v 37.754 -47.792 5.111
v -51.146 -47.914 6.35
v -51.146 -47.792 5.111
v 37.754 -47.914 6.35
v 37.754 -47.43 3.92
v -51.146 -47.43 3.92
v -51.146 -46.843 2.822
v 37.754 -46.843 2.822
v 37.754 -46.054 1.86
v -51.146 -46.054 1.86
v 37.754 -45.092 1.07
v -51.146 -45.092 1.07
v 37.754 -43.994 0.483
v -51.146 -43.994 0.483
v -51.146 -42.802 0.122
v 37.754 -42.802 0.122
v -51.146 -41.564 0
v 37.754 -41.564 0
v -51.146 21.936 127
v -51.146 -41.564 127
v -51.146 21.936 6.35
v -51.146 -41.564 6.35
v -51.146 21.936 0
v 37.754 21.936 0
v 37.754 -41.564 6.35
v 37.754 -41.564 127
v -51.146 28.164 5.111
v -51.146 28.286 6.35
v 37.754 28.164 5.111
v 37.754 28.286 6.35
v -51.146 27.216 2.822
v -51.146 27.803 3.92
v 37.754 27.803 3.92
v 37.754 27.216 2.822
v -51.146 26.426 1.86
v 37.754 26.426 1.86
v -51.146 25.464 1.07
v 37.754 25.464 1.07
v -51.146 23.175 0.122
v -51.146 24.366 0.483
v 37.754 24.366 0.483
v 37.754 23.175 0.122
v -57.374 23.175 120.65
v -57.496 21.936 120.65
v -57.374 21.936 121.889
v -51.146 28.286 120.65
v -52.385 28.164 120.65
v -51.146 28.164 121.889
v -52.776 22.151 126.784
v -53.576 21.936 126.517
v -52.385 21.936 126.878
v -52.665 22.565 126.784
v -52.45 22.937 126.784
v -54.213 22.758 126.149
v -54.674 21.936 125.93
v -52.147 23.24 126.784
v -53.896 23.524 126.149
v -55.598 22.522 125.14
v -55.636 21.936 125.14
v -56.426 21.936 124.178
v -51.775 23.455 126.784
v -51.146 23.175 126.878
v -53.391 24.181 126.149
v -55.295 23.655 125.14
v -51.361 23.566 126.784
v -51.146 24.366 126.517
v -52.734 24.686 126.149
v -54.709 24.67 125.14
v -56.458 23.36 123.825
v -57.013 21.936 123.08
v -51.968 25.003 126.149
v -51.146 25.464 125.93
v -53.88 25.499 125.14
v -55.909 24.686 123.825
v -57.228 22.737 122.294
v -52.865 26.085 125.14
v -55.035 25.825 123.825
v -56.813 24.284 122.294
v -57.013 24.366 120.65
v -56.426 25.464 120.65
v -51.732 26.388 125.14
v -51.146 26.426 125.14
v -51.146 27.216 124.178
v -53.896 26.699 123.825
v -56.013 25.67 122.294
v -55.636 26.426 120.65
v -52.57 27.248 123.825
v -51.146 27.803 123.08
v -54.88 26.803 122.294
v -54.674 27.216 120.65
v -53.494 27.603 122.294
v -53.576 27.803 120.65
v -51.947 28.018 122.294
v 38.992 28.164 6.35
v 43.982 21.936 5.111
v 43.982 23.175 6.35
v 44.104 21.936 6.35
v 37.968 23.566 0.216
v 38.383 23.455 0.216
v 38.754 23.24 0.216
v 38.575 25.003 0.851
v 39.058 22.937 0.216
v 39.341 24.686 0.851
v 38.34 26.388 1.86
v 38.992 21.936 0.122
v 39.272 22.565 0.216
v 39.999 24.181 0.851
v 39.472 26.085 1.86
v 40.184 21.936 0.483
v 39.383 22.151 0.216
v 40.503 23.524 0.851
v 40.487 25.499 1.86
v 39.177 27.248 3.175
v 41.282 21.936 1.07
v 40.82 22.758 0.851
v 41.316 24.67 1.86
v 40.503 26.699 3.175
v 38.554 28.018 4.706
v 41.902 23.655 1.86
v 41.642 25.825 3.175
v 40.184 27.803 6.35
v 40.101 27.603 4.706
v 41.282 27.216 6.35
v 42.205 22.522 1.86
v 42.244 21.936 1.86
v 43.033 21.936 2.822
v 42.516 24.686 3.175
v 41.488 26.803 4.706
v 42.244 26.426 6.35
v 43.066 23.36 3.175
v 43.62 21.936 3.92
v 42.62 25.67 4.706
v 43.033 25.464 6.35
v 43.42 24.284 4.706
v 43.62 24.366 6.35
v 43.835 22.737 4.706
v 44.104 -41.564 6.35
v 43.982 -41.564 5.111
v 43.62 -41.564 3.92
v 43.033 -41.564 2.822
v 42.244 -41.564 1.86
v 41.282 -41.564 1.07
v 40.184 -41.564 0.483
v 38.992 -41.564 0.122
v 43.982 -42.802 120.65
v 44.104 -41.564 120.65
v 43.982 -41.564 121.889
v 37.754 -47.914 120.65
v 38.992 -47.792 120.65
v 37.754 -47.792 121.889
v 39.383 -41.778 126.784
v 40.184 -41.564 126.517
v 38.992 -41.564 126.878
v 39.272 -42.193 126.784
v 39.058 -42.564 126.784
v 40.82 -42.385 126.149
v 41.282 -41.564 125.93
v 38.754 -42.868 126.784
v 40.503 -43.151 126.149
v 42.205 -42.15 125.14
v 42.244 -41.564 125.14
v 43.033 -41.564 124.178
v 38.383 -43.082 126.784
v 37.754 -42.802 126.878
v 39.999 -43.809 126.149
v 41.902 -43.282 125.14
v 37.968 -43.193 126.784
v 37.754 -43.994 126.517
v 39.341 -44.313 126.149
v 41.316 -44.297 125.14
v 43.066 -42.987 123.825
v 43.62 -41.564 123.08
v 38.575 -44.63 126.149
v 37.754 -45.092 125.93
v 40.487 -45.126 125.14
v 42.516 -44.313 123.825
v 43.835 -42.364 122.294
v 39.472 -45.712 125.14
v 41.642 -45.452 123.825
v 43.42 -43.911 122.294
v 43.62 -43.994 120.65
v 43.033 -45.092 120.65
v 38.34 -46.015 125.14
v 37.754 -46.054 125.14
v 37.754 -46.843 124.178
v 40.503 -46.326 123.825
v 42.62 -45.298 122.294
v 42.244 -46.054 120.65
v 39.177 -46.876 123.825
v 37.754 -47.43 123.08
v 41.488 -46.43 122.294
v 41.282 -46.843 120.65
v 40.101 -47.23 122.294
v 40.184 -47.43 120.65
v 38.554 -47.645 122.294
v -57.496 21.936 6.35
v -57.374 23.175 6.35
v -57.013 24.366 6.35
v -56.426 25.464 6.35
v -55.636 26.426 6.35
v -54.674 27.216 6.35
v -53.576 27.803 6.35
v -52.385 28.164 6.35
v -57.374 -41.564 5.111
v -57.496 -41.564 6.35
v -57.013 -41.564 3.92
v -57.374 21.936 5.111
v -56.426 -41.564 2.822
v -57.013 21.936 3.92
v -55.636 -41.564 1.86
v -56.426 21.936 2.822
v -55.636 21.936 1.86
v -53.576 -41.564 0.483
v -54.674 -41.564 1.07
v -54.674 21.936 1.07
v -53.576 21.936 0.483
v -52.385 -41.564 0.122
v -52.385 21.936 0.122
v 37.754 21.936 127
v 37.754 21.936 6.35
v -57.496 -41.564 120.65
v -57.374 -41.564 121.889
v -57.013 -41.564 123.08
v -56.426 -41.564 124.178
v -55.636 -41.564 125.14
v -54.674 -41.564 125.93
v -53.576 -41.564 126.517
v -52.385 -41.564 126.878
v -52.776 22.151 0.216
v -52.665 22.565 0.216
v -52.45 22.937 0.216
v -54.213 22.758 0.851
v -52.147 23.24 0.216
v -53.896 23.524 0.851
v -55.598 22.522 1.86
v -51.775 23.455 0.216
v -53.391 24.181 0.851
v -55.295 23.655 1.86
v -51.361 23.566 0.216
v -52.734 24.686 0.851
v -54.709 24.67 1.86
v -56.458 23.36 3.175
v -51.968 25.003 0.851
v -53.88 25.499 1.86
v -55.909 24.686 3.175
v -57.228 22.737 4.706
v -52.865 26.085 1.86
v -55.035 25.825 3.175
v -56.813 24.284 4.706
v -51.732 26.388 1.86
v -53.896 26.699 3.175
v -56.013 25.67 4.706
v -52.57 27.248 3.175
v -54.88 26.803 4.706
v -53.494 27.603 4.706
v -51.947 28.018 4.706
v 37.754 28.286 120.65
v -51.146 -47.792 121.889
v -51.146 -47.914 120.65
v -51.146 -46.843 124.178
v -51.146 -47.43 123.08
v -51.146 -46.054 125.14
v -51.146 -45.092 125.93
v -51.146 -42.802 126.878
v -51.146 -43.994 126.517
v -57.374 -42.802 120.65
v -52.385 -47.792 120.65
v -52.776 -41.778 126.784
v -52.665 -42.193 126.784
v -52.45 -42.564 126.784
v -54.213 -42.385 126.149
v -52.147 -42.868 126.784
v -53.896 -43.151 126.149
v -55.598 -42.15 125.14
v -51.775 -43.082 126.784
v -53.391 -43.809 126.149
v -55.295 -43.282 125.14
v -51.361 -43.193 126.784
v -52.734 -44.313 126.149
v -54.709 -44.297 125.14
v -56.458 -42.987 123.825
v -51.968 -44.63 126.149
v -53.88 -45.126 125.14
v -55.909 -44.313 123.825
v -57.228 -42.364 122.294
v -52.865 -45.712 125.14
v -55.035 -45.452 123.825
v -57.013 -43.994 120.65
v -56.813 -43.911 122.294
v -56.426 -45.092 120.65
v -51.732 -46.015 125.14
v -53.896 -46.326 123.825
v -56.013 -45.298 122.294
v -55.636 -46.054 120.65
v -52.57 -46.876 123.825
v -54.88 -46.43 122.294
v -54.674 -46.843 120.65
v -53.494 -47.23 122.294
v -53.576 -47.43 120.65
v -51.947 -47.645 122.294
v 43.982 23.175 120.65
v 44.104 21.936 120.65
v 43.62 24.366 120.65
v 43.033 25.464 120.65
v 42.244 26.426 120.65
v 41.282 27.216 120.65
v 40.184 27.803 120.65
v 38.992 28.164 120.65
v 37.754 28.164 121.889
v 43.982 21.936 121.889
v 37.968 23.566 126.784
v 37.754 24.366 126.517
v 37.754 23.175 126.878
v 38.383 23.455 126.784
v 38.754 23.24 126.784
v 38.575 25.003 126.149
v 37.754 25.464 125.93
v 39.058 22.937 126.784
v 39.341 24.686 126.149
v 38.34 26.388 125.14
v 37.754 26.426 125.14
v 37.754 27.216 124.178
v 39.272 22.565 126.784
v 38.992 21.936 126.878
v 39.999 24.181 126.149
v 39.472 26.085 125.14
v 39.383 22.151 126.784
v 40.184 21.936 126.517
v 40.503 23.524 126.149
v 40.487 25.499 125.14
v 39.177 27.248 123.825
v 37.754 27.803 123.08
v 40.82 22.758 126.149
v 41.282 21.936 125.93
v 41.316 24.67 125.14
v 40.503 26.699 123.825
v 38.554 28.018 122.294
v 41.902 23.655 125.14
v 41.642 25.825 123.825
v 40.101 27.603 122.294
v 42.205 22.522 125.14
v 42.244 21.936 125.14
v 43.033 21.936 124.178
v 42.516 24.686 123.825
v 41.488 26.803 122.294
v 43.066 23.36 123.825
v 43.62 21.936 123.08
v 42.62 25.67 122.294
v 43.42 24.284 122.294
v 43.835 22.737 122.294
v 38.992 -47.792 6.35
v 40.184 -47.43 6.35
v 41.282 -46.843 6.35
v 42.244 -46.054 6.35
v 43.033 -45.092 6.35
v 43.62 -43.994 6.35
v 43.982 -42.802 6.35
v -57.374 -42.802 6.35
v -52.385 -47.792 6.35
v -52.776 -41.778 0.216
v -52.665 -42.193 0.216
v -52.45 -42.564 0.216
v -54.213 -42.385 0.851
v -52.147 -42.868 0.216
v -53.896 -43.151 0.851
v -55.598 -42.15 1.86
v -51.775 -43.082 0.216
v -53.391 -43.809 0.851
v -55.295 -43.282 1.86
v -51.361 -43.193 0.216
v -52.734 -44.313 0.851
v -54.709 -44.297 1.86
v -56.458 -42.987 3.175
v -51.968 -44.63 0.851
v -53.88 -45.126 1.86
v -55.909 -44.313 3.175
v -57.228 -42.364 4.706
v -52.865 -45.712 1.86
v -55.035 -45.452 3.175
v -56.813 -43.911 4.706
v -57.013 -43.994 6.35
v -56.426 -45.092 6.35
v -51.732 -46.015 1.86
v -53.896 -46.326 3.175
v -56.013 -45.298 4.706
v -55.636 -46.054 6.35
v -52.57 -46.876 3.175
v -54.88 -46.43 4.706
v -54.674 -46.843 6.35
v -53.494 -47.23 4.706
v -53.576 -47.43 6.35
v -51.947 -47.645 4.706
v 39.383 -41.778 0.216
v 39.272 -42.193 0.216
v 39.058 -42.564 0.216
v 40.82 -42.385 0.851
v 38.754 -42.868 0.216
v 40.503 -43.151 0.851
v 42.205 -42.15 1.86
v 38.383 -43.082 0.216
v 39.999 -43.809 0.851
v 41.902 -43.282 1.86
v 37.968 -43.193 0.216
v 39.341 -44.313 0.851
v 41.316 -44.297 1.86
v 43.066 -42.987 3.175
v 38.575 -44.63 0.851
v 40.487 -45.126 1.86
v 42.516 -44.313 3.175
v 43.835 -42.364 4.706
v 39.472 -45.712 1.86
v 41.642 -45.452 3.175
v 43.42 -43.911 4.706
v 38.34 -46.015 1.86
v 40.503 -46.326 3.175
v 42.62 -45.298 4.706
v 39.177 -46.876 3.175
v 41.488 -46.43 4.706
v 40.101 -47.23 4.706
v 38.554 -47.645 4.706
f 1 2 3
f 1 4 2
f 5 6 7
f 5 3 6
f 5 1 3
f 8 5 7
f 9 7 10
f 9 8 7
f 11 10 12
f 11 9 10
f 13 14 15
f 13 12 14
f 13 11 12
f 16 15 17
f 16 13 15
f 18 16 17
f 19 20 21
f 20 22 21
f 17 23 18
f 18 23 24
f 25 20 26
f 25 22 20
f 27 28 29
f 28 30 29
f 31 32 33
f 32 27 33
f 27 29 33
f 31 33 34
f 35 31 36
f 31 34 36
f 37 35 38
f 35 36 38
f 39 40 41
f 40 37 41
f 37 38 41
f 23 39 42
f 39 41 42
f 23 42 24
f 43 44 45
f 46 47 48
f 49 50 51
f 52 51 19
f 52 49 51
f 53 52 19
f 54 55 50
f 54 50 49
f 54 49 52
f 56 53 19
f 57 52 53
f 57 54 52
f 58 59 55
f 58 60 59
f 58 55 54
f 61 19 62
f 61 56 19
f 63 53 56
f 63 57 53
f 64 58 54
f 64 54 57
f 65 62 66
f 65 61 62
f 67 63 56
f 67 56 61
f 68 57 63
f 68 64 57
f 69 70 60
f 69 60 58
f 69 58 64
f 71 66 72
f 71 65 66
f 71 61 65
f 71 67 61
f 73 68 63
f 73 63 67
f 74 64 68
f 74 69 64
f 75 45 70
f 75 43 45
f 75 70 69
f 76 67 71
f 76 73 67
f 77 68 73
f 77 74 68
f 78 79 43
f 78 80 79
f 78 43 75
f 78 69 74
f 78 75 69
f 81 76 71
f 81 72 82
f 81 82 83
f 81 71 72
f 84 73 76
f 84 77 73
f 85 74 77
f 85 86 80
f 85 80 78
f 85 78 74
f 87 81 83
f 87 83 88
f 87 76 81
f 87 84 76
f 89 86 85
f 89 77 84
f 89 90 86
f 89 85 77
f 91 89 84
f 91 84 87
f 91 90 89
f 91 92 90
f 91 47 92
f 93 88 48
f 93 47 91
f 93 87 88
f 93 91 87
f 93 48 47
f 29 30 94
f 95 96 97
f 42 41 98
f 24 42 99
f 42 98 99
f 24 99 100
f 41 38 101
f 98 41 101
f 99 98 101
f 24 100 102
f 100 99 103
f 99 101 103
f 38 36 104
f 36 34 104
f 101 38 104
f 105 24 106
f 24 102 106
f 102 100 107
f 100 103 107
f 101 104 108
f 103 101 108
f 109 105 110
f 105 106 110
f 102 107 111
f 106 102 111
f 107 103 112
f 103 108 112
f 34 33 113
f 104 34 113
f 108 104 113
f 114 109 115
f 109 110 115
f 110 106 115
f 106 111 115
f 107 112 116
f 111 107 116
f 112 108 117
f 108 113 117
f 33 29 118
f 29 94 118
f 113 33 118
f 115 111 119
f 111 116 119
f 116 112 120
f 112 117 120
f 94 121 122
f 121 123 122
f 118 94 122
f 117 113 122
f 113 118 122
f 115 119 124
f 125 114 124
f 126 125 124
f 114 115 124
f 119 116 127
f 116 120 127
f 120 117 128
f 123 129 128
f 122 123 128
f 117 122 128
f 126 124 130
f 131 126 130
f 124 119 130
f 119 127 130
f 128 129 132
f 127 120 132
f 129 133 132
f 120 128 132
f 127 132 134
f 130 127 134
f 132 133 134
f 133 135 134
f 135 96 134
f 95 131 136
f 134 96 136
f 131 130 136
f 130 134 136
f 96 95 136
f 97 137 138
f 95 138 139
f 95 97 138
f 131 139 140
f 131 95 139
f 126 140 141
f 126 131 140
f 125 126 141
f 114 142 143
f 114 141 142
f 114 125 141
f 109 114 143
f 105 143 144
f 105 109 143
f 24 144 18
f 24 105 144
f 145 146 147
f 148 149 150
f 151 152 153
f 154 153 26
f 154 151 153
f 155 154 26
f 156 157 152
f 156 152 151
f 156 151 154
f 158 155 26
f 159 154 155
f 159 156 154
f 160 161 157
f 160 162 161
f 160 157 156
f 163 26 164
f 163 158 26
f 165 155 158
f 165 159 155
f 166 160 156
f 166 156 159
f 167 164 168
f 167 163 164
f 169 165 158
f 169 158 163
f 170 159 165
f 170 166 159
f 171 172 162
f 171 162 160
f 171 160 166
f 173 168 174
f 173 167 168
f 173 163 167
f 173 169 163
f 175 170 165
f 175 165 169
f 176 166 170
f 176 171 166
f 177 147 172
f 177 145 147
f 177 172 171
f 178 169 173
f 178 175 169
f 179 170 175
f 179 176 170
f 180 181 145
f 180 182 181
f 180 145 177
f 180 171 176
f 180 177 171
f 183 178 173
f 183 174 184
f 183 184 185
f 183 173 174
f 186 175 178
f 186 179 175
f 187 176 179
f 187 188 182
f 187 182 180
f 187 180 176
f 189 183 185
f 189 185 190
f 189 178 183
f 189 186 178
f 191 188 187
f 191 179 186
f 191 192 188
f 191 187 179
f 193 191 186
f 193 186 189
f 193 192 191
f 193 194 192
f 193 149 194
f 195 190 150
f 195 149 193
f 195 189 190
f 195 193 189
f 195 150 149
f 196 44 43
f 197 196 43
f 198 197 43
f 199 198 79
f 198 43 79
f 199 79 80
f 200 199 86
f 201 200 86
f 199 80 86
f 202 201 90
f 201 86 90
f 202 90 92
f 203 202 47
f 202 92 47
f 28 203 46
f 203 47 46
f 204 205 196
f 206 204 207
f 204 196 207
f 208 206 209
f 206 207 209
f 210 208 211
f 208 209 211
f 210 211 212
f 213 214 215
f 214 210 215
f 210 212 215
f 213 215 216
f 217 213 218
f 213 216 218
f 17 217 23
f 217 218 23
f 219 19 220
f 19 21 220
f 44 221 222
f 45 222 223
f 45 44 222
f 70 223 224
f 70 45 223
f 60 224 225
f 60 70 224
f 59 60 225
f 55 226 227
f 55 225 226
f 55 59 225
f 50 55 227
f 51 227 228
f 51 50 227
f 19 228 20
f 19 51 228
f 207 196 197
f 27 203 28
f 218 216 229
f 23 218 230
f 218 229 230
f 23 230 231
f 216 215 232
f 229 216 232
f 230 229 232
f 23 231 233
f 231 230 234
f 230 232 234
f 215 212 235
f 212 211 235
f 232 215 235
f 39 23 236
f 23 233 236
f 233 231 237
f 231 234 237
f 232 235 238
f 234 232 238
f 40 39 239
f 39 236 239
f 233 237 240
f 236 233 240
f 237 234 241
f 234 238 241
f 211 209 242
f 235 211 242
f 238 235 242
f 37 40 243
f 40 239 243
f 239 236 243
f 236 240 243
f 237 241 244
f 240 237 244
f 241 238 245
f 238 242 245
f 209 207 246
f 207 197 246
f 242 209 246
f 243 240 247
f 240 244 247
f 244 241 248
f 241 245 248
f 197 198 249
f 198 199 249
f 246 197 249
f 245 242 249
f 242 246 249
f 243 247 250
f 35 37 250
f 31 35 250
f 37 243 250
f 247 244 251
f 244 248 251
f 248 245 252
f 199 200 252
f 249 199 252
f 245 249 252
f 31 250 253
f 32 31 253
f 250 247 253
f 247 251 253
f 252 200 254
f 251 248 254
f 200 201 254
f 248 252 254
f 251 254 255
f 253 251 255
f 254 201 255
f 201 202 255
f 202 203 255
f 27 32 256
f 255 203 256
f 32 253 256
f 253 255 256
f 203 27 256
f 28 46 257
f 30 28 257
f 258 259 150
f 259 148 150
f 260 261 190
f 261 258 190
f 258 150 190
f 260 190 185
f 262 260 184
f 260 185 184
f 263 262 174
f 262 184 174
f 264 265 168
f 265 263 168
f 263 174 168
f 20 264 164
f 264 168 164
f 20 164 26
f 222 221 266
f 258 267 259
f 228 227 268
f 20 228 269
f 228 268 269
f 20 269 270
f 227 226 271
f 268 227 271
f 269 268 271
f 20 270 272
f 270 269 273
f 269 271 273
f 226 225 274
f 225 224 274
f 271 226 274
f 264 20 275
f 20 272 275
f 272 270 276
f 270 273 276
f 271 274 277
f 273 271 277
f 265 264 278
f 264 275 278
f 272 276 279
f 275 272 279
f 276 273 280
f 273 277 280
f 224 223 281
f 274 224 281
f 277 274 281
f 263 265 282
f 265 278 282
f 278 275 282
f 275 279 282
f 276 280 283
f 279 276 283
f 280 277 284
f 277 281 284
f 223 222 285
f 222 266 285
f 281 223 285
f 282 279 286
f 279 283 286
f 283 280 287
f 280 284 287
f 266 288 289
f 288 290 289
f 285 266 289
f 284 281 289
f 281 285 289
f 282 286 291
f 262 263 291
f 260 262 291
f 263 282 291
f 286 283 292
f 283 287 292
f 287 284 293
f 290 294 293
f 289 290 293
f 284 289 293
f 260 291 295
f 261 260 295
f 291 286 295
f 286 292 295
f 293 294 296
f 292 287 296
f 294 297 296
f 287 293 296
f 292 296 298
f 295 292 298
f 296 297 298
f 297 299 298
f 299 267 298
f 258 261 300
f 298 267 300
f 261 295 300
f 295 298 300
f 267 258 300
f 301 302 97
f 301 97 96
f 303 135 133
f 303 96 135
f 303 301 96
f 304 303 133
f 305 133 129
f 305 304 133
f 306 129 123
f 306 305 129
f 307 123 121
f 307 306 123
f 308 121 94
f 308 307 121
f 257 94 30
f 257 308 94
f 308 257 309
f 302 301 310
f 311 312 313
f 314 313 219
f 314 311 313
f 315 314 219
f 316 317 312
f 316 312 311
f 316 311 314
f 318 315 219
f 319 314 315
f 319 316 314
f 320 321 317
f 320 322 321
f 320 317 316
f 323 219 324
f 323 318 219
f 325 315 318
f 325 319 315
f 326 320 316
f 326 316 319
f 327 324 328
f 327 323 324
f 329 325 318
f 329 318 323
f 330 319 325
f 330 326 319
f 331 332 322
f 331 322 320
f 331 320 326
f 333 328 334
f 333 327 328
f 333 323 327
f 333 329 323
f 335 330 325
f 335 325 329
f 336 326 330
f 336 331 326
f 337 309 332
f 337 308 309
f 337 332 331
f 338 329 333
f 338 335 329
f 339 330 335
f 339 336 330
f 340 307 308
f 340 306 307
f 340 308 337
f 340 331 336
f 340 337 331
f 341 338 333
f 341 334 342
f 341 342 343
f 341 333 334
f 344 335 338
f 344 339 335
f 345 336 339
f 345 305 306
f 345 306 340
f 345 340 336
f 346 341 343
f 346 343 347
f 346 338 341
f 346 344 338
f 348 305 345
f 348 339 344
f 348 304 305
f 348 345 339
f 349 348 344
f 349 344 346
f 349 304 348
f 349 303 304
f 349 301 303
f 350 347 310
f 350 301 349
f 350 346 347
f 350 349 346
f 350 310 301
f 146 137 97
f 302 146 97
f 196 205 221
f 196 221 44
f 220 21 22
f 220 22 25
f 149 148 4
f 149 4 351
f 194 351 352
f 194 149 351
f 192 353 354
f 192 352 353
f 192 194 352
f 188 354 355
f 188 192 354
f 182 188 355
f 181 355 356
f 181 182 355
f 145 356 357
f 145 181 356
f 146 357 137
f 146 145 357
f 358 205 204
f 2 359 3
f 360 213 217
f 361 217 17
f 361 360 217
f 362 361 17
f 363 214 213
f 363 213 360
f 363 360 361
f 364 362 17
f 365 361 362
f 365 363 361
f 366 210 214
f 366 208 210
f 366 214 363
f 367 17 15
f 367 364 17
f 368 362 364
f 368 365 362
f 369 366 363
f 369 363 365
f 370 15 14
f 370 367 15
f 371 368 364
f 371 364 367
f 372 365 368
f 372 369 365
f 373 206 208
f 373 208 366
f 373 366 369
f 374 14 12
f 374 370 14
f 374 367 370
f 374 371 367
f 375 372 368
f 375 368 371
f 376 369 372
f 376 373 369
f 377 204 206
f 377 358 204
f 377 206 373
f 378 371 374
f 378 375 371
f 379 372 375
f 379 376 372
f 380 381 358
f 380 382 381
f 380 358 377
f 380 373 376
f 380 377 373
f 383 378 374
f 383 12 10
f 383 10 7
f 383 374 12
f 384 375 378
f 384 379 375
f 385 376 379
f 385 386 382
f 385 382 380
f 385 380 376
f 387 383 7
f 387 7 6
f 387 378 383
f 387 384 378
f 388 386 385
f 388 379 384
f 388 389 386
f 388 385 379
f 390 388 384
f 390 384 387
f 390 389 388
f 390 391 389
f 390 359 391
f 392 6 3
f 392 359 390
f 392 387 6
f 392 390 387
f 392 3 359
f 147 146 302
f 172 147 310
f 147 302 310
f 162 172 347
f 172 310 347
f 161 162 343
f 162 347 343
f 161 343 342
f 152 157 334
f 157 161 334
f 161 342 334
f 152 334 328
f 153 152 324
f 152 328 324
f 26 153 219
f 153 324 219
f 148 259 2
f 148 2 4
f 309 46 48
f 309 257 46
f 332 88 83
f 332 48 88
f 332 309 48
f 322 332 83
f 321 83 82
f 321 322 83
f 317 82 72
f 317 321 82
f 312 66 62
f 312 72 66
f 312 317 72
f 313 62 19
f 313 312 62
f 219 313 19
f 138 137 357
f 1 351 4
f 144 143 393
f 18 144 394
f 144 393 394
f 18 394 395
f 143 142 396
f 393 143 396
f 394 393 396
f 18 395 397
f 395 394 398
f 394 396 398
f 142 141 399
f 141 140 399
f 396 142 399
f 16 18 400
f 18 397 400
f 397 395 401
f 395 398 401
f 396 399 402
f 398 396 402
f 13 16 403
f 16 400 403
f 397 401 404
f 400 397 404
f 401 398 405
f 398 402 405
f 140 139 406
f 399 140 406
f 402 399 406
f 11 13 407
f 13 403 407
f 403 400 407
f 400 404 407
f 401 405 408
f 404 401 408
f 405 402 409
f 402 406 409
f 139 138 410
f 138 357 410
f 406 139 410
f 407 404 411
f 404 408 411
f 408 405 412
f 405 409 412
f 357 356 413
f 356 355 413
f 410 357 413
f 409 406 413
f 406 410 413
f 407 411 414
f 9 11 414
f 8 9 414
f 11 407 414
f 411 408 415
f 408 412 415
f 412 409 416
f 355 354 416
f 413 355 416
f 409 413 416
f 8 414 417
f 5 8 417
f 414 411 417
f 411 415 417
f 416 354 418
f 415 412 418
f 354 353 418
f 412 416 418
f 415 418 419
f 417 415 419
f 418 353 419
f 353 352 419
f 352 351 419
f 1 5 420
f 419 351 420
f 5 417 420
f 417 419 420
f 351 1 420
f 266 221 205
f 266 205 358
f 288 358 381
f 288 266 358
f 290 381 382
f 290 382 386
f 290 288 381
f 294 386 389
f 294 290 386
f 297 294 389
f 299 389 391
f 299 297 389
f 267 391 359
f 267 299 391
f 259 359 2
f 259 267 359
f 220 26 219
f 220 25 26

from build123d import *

# Parameters (mm, degrees)
F0_W     = 101.6
F0_H     = 76.2
F1_DEPTH = 127
F2_T     = -6.35
F3_R     = 6.34999


# Not quite as in the source:
# - a fillet or chamfer is up to 0.001 mm smaller than in the source, because OpenCascade refuses the exact size


with BuildPart() as f1:
    # F0 (on Top) → F1 (new body)
    with BuildSketch(Plane.XY):
        with Locations((-6.6963651597, -9.8136370122)):
            Rectangle(F0_W, F0_H)
    extrude(amount=F1_DEPTH)

    # F2
    f2_openings = [f1.faces().sort_by_distance(p)[0] for p in [
        (-6.696365, -9.813637, 127),
    ]]
    offset(amount=F2_T, openings=f2_openings)

    # F3 (radius 6.35 in the source; OpenCascade refuses exactly that, so slightly less here)
    f3_edges = [f1.edges().sort_by_distance(p)[0] for p in [
        (-57.496365, -47.913637, 63.5),
        (-57.496365, 28.286363, 63.5),
        (-57.496365, -9.813637, 0),
        (-57.496365, -9.813637, 127),
        (44.103635, 28.286363, 63.5),
        (-6.696365, 28.286363, 0),
        (-6.696365, 28.286363, 127),
        (44.103635, -47.913637, 63.5),
        (44.103635, -9.813637, 0),
        (44.103635, -9.813637, 127),
        (-6.696365, -47.913637, 0),
        (-6.696365, -47.913637, 127),
    ]]
    fillet(f3_edges, radius=F3_R)


solid = f1.part
